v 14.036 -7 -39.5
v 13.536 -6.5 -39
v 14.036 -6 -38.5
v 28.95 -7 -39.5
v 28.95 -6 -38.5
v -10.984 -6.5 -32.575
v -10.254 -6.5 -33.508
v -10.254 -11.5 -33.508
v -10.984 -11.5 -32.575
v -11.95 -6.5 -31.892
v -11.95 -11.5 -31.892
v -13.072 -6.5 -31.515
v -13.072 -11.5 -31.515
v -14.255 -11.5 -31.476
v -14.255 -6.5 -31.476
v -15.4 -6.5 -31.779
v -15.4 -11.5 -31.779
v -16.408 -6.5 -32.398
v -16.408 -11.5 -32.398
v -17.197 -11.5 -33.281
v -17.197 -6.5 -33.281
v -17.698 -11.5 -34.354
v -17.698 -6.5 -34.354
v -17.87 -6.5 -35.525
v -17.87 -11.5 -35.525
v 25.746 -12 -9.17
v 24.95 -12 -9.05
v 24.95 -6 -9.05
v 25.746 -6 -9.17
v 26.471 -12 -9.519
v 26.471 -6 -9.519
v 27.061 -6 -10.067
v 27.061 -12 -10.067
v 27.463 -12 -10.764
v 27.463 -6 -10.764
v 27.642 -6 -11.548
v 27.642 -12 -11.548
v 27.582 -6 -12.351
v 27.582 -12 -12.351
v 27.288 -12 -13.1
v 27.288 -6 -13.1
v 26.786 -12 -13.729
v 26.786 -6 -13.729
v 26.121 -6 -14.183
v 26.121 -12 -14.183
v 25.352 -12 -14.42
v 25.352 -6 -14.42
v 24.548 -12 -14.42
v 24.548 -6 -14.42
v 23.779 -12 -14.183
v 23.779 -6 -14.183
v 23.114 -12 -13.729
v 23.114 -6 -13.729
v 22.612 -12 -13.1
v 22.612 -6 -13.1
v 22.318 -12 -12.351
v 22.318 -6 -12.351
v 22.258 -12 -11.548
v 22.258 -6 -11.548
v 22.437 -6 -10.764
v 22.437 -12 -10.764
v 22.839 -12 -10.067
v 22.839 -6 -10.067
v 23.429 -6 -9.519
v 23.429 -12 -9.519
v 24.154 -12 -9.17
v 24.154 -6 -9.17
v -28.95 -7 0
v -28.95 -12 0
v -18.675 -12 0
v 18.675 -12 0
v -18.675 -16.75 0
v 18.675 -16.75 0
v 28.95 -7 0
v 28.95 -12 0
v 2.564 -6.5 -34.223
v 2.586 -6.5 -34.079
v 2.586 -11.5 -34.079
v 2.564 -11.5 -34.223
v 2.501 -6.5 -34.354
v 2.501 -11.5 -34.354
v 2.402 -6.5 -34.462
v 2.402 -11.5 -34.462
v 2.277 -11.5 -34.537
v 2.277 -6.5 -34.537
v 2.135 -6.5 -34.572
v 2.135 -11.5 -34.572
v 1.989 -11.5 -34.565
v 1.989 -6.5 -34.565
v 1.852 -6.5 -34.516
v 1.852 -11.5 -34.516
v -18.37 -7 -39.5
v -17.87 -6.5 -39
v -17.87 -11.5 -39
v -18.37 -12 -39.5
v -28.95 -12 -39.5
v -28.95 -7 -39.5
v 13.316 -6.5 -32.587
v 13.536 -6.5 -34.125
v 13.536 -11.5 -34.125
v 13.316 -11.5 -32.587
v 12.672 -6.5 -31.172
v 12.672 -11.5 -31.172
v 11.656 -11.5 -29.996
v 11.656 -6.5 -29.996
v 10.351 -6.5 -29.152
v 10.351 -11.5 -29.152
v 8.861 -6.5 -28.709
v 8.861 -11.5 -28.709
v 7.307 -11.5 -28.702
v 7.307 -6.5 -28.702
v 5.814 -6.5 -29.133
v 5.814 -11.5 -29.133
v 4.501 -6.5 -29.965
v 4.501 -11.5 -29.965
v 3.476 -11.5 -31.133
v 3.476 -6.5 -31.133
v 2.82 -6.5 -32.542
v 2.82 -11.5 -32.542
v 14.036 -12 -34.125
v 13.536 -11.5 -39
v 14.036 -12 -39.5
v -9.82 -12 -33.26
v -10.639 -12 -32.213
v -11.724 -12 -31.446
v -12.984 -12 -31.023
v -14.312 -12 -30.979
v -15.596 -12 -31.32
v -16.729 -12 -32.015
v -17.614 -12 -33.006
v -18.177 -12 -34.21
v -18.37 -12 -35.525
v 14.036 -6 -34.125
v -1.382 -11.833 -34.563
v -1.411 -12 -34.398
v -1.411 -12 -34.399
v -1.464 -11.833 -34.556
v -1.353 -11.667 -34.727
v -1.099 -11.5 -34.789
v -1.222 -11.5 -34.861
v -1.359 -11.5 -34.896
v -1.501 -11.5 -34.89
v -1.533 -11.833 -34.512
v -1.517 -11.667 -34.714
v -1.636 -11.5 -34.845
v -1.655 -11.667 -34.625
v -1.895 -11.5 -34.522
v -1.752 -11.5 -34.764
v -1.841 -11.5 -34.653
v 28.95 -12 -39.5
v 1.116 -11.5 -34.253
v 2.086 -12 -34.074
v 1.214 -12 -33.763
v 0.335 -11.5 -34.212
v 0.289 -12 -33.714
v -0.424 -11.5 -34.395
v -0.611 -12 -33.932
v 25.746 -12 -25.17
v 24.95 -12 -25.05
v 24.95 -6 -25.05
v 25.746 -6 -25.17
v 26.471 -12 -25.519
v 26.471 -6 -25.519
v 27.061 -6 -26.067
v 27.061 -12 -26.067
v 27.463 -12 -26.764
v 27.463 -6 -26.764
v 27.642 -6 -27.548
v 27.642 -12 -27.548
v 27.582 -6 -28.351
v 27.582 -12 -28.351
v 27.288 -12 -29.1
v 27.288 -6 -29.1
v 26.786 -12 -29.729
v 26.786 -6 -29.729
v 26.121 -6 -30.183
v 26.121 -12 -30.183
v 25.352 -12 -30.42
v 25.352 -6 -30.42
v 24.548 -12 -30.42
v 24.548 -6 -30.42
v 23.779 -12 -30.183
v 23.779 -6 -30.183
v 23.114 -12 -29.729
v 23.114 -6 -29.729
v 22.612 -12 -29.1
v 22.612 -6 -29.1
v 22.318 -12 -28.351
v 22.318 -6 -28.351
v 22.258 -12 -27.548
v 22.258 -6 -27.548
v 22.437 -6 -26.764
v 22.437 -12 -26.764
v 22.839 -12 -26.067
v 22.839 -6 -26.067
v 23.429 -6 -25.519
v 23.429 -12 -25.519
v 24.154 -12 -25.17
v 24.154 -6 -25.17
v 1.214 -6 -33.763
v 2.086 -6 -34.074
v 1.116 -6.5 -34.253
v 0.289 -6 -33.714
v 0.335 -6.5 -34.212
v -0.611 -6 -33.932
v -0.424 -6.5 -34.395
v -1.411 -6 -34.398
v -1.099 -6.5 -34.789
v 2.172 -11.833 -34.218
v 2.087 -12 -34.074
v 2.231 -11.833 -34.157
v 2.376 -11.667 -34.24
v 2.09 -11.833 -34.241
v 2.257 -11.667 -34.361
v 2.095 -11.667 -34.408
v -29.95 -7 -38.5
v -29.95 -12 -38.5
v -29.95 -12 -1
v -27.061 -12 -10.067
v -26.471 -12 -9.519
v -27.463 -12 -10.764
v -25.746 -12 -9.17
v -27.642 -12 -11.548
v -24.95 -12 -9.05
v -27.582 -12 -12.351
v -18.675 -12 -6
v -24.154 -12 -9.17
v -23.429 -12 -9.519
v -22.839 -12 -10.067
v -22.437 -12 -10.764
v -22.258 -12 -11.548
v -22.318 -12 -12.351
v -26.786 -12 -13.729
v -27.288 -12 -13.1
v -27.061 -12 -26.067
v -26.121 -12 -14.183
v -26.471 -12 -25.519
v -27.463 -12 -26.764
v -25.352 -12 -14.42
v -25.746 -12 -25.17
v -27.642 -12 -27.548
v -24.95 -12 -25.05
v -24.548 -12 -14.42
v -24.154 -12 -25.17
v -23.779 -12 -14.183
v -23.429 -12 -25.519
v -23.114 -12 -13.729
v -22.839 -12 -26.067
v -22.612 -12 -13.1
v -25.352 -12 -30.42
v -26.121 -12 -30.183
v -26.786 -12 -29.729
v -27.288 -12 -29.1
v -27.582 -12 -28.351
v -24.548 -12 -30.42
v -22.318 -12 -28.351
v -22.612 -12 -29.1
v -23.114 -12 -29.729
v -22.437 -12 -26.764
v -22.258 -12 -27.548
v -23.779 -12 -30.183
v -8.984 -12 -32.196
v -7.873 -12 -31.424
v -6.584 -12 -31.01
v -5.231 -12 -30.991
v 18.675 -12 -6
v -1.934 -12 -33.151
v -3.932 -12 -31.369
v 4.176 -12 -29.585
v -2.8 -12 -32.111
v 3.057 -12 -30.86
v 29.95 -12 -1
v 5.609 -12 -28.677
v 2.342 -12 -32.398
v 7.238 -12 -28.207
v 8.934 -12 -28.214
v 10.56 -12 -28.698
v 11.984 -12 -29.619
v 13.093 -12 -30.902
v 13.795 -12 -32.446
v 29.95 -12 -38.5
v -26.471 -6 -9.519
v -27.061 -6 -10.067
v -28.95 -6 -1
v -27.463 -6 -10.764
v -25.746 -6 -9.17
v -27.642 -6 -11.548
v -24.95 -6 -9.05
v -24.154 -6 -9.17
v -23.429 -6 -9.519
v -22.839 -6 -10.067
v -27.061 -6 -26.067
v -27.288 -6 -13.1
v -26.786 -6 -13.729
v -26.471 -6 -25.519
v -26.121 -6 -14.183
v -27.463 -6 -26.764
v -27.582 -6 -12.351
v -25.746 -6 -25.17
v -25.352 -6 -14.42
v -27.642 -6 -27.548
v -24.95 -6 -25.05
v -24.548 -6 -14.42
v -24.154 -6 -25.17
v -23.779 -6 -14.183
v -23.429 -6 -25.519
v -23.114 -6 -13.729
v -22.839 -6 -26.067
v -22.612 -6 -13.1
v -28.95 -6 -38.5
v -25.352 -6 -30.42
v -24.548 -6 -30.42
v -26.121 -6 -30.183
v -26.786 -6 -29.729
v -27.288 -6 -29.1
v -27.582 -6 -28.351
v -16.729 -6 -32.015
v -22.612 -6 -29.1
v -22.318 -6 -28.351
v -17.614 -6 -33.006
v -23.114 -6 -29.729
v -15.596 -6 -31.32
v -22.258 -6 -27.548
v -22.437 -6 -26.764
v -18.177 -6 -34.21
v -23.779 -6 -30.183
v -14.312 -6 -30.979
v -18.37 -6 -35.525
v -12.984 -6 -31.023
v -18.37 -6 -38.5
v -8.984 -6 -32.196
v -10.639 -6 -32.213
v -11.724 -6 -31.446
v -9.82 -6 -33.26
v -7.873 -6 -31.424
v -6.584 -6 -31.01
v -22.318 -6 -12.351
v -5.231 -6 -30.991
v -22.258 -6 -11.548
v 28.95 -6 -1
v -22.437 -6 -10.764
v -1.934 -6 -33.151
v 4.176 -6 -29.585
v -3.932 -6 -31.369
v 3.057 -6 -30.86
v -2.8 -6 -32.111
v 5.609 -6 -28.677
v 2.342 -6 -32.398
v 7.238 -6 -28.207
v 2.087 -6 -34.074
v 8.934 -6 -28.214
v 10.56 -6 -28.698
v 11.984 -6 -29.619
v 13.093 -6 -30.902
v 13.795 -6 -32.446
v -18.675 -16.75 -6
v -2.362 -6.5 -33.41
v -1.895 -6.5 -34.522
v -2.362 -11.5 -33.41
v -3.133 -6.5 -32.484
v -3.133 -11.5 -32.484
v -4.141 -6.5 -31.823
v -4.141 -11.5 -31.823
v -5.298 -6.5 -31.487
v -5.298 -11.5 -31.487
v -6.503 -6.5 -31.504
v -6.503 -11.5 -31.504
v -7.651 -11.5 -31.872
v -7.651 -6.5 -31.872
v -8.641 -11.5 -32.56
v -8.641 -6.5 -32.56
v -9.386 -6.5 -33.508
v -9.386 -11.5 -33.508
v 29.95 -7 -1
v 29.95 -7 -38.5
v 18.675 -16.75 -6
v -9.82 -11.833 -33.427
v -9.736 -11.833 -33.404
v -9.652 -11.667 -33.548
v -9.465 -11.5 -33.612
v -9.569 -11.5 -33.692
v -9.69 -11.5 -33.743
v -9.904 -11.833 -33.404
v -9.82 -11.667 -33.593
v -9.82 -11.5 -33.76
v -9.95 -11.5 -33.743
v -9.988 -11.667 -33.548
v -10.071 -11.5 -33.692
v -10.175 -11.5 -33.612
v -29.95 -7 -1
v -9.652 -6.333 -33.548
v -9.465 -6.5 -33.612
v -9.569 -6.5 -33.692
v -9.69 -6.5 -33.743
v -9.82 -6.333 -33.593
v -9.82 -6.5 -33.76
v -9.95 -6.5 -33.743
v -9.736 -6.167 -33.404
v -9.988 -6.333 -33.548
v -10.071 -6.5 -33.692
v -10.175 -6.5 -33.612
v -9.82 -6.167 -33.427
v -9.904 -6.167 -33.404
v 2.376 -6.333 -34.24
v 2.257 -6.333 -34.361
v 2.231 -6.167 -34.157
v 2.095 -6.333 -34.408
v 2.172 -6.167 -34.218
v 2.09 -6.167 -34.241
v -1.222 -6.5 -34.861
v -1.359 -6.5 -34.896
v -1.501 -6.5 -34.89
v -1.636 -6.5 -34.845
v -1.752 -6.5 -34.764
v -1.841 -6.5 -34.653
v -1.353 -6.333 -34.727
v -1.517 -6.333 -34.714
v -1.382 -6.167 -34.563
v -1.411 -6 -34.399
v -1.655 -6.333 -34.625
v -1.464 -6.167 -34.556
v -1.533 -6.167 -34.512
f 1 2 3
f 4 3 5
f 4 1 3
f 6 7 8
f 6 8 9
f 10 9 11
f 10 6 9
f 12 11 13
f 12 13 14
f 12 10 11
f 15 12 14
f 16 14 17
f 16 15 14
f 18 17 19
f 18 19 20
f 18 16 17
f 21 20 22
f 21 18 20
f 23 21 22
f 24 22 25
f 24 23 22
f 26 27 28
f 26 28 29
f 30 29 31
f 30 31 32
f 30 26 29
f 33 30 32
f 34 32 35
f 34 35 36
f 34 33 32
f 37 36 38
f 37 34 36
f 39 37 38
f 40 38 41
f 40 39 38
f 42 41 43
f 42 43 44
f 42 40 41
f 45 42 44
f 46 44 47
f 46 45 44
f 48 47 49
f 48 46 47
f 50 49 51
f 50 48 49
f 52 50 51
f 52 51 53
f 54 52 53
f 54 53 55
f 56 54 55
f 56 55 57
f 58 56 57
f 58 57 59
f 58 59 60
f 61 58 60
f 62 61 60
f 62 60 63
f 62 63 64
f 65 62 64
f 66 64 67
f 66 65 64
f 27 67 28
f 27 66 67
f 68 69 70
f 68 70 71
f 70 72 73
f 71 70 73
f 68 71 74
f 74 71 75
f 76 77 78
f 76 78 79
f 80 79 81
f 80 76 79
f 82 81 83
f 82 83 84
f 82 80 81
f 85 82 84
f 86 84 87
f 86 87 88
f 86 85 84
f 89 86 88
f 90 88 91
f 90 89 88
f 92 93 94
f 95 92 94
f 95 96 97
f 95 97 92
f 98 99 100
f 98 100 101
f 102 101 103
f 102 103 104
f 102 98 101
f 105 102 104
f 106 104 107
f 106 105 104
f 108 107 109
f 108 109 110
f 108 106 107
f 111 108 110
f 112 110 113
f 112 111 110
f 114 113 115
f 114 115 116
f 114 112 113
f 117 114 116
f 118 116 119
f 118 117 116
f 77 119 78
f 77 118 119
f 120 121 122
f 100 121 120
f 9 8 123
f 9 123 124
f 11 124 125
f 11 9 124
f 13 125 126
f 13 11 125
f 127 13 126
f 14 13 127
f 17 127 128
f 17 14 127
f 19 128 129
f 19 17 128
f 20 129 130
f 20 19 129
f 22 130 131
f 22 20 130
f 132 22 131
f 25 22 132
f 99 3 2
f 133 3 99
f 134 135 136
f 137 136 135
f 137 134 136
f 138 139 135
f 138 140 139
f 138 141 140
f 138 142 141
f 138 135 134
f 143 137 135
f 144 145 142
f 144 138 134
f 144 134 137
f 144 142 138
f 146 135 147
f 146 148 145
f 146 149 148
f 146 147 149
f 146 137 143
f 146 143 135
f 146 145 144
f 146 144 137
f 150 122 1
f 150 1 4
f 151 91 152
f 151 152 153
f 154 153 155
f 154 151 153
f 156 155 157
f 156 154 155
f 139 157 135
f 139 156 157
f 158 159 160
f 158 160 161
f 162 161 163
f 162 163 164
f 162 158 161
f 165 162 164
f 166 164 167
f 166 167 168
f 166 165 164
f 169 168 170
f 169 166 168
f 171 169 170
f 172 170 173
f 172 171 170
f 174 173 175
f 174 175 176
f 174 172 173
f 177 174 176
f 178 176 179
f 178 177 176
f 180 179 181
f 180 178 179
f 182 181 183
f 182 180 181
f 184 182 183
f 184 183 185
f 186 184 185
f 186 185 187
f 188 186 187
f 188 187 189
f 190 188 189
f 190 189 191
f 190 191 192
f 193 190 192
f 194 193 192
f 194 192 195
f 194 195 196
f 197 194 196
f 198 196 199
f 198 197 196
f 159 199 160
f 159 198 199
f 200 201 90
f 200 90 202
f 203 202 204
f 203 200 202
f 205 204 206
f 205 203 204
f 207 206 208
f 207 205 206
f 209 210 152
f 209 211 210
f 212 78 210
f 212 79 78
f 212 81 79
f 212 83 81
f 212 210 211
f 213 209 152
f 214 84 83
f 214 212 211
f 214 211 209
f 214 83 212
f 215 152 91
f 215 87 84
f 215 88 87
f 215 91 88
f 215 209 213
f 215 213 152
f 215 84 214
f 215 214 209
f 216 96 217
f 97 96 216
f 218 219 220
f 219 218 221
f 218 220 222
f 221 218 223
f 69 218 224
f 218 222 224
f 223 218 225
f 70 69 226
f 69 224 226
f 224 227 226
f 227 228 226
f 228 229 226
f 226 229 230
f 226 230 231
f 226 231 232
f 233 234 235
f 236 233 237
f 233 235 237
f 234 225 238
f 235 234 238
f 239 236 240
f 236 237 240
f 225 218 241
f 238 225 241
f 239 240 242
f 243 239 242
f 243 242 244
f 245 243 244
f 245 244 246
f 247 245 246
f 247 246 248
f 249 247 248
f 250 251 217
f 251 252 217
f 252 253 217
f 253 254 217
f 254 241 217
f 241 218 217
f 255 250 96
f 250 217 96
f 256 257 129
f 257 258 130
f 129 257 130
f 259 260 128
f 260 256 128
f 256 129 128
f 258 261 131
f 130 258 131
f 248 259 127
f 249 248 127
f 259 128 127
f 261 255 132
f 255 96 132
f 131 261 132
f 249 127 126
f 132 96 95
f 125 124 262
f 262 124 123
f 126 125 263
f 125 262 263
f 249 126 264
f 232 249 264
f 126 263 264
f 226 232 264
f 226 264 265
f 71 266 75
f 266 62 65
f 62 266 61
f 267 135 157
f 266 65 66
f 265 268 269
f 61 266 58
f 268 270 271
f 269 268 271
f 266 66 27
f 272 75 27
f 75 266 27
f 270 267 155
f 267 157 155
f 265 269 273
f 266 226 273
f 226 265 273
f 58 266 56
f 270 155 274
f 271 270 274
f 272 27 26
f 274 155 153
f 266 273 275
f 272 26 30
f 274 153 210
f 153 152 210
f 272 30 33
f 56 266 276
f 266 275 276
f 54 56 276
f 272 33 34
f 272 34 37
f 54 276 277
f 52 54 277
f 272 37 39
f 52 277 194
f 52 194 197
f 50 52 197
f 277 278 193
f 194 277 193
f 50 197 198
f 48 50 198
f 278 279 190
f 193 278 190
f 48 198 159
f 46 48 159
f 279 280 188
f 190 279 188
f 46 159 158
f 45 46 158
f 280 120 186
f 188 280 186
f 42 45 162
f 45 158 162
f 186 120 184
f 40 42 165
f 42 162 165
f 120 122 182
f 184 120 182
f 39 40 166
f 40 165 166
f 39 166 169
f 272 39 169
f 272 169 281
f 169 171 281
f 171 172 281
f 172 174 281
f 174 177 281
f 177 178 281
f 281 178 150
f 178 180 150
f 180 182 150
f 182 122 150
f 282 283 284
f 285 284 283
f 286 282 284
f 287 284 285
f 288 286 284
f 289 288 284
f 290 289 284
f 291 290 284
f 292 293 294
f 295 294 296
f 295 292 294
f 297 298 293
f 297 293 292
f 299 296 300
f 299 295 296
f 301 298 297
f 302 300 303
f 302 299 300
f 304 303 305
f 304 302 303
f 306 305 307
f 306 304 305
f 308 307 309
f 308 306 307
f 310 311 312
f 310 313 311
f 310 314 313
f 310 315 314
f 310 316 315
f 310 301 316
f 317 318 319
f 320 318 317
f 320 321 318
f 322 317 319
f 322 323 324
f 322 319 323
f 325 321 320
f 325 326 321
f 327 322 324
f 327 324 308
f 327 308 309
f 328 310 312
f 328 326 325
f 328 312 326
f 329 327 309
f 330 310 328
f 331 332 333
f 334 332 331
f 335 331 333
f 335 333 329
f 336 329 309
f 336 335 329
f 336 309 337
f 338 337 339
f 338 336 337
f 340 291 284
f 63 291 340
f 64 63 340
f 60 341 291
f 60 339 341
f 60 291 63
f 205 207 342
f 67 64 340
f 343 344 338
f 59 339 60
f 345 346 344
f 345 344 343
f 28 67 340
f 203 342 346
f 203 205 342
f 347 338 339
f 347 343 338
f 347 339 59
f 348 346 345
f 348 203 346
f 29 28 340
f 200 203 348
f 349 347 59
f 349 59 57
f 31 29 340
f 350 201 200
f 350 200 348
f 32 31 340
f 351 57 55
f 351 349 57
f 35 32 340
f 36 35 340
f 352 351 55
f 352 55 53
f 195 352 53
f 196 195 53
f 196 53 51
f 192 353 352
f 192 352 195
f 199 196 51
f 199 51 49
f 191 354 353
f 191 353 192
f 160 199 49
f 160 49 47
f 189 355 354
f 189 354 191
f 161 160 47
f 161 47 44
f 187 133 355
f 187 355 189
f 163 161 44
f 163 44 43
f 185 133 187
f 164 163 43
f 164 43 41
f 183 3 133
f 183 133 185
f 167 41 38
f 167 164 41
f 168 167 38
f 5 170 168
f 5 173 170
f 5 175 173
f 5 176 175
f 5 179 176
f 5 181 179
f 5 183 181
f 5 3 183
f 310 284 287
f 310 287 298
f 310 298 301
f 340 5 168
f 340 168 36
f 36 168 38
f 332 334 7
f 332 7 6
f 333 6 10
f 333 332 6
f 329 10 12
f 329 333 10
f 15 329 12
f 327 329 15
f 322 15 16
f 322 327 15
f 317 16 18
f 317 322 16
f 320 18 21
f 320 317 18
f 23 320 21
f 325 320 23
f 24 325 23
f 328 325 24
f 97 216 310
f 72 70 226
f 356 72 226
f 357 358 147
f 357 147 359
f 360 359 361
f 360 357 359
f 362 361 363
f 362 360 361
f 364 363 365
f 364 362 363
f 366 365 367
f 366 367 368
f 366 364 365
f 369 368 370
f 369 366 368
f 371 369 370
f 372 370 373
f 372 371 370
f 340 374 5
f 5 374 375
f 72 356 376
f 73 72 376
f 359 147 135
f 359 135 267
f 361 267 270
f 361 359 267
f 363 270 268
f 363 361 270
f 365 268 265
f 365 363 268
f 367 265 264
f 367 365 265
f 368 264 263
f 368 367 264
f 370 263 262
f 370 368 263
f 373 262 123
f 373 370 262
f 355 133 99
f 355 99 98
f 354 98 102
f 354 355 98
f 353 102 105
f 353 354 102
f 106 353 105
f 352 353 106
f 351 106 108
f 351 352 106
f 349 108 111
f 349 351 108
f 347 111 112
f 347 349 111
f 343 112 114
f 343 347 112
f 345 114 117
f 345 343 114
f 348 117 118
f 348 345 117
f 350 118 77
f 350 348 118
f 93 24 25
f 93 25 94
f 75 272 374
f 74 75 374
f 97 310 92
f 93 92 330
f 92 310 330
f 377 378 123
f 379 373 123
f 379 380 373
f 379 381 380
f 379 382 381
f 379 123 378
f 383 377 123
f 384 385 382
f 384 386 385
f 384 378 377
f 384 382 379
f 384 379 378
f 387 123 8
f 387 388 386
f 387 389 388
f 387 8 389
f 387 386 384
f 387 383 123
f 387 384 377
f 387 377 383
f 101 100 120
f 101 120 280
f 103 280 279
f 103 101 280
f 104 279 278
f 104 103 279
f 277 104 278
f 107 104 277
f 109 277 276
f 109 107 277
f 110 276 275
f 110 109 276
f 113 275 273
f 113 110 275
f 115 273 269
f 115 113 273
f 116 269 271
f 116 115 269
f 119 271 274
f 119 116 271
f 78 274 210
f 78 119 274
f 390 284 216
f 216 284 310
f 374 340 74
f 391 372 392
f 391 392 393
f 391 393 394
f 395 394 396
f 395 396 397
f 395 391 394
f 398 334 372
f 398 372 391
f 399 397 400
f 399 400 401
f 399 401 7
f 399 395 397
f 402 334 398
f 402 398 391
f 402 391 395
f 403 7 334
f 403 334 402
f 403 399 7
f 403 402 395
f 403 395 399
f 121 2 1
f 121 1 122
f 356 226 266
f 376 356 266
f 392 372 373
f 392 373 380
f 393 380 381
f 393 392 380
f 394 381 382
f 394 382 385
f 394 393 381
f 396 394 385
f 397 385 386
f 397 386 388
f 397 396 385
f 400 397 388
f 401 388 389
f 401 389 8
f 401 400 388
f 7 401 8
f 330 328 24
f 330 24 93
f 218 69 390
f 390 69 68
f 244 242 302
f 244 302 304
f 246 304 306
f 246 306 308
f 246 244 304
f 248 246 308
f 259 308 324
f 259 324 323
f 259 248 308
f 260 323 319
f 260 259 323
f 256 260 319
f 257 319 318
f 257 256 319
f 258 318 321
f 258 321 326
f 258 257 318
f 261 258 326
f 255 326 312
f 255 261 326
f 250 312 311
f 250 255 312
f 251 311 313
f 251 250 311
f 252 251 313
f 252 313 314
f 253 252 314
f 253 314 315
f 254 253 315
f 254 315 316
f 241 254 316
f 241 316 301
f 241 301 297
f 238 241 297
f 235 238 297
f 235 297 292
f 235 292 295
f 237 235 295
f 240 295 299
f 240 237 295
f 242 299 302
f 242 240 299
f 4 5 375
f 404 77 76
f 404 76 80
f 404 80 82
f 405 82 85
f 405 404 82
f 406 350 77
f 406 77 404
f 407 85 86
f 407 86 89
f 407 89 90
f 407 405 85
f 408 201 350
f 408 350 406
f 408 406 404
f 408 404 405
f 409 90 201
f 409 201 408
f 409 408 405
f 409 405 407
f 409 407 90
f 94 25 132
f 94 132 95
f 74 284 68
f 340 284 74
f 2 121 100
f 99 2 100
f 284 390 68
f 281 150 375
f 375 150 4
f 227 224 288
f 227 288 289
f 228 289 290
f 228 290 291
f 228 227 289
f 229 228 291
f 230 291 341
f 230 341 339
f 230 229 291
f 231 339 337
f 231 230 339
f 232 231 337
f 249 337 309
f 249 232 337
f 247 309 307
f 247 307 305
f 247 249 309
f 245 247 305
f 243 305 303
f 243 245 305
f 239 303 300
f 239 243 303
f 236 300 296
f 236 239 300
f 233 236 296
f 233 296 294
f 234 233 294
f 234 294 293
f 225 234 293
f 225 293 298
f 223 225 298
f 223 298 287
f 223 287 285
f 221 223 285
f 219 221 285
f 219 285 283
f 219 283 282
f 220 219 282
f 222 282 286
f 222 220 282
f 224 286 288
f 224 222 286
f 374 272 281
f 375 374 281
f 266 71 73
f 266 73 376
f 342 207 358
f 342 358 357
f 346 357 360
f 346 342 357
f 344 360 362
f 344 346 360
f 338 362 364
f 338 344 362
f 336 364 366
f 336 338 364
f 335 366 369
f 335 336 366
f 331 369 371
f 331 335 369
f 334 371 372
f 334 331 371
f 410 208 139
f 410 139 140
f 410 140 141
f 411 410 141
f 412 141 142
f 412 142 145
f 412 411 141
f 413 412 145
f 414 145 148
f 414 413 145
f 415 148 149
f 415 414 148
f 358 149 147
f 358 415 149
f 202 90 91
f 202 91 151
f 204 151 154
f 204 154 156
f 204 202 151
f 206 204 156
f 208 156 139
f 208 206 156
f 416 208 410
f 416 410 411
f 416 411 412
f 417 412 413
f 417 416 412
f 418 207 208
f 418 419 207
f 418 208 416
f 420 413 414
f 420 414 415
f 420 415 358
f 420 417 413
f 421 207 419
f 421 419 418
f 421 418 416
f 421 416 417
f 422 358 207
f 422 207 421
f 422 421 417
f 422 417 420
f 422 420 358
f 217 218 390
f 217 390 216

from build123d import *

# Parameters (mm, degrees)
SKETCH3_W           = 37.35
SKETCH3_H           = 6
BOSS_EXTRUDE1_DEPTH = 4.75
SKETCH4_W           = 59.9
SKETCH4_H           = 39.5
SKETCH4_R           = 2.7
BOSS_EXTRUDE2_DEPTH = 6
CUT_EXTRUDE1_REACH  = 52.723
CHAMFER1_SIZE       = 1
CHAMFER2_SIZE       = 0.5


with BuildPart() as part:
    # Sketch3 → Boss-Extrude1 (new body)
    with BuildSketch(Plane(origin=(0, 0, 0), x_dir=(1, 0, 0), z_dir=(0, 1, 0))):
        with Locations((0, 3)):
            Rectangle(SKETCH3_W, SKETCH3_H)
    extrude(amount=BOSS_EXTRUDE1_DEPTH)

    # Sketch4 → Boss-Extrude2 (add)
    with BuildSketch(Plane(origin=(0, 0, 0), x_dir=(1, 0, 0), z_dir=(0, 1, 0))):
        with Locations((0, 19.75)):
            Rectangle(SKETCH4_W, SKETCH4_H)
        with Locations(Location((-24.95, 11.75, 0), (0, 0, 270))):
            Circle(SKETCH4_R, mode=Mode.SUBTRACT)
        with Locations(Location((-24.95, 27.75, 0), (0, 0, 270))):
            Circle(SKETCH4_R, mode=Mode.SUBTRACT)
        with Locations(Location((24.95, 11.75, 0), (0, 0, 270))):
            Circle(SKETCH4_R, mode=Mode.SUBTRACT)
        with Locations(Location((24.95, 27.75, 0), (0, 0, 270))):
            Circle(SKETCH4_R, mode=Mode.SUBTRACT)
    extrude(amount=-BOSS_EXTRUDE2_DEPTH)

    # Sketch5 → Cut-Extrude1 (cut, up to next)
    with BuildSketch(Plane.XZ.offset(6), mode=Mode.PRIVATE) as cut_extrude1_sk1:
        with BuildLine():
            Line((-17.87, -35.525), (-17.87, -39.5))
            Line((-17.87, -39.5), (13.536249219, -39.5))
            Line((13.536249219, -39.5), (13.536249219, -34.125))
            ThreePointArc((13.536249219, -34.125), (8.084468405, -28.650049236), (2.586446162, -34.078562046))
            ThreePointArc((2.586446162, -34.078562046), (2.342198533, -34.503972069), (1.851800837, -34.515833459))
            ThreePointArc((1.851800837, -34.515833459), (0.335489147, -34.21151821), (-1.099084421, -34.789279052))
            ThreePointArc((-1.099084421, -34.789279052), (-1.570217122, -34.872337403), (-1.895484475, -34.521529961))
            ThreePointArc((-1.895484475, -34.521529961), (-5.298347165, -31.486832634), (-9.38557377, -33.507585225))
            ThreePointArc((-9.38557377, -33.507585225), (-9.82, -33.760049669), (-10.25442623, -33.507585225))
            ThreePointArc((-10.25442623, -33.507585225), (-14.838500571, -31.585871726), (-17.87, -35.525))
        make_face()
    cut_extrude1_tool1 = extrude(cut_extrude1_sk1.sketch, amount=-CUT_EXTRUDE1_REACH, mode=Mode.PRIVATE) & part.part
    add(cut_extrude1_tool1.solids().sort_by_distance((-1.140343, -6, -35.39747))[0], mode=Mode.SUBTRACT)

    # Chamfer1
    chamfer1_edges = [part.edges().sort_by_distance(p)[0] for p in [
        (-29.95, -6, -19.75),
        (-29.95, -3, 0),
        (21.74312461, -6, -39.5),
        (-29.95, -3, -39.5),
        (29.95, -6, -19.75),
        (29.95, -3, -39.5),
        (0, -6, 0),
        (29.95, -3, 0),
        (-23.91, -6, -39.5),
    ]]
    chamfer(chamfer1_edges, length=CHAMFER1_SIZE)

    # Chamfer2
    chamfer2_edges = [part.edges().sort_by_distance(p)[0] for p in [
        (13.536249219, 0, -36.8125),
        (8.084468405, 0, -28.650049236),
        (2.342198533, 0, -34.503972069),
        (0.335489147, 0, -34.21151821),
        (-1.570217122, 0, -34.872337403),
        (-5.298347165, 0, -31.486832634),
        (-9.82, 0, -33.760049669),
        (-14.838500571, 0, -31.585871726),
        (-17.87, 0, -37.5125),
        (13.536249219, -6, -36.3125),
        (8.084468405, -6, -28.650049236),
        (2.342198533, -6, -34.503972069),
        (0.335489147, -6, -34.21151821),
        (-1.570217122, -6, -34.872337403),
        (-5.298347165, -6, -31.486832634),
        (-9.82, -6, -33.760049669),
        (-14.838500571, -6, -31.585871726),
        (-17.87, -6, -37.0125),
        (13.536249219, -2.5, -39.5),
        (-17.87, -2.5, -39.5),
    ]]
    chamfer(chamfer2_edges, length=CHAMFER2_SIZE - 0.0001)  # a hair under: the kernel refuses the full size


with BuildPart() as body_2:
    # Mirror1: mirrored copy
    add(part.part.mirror(Plane(origin=(0, -6, 0), x_dir=(0, 0, 1), z_dir=(0, -1, 0))))


solid = body_2.part
